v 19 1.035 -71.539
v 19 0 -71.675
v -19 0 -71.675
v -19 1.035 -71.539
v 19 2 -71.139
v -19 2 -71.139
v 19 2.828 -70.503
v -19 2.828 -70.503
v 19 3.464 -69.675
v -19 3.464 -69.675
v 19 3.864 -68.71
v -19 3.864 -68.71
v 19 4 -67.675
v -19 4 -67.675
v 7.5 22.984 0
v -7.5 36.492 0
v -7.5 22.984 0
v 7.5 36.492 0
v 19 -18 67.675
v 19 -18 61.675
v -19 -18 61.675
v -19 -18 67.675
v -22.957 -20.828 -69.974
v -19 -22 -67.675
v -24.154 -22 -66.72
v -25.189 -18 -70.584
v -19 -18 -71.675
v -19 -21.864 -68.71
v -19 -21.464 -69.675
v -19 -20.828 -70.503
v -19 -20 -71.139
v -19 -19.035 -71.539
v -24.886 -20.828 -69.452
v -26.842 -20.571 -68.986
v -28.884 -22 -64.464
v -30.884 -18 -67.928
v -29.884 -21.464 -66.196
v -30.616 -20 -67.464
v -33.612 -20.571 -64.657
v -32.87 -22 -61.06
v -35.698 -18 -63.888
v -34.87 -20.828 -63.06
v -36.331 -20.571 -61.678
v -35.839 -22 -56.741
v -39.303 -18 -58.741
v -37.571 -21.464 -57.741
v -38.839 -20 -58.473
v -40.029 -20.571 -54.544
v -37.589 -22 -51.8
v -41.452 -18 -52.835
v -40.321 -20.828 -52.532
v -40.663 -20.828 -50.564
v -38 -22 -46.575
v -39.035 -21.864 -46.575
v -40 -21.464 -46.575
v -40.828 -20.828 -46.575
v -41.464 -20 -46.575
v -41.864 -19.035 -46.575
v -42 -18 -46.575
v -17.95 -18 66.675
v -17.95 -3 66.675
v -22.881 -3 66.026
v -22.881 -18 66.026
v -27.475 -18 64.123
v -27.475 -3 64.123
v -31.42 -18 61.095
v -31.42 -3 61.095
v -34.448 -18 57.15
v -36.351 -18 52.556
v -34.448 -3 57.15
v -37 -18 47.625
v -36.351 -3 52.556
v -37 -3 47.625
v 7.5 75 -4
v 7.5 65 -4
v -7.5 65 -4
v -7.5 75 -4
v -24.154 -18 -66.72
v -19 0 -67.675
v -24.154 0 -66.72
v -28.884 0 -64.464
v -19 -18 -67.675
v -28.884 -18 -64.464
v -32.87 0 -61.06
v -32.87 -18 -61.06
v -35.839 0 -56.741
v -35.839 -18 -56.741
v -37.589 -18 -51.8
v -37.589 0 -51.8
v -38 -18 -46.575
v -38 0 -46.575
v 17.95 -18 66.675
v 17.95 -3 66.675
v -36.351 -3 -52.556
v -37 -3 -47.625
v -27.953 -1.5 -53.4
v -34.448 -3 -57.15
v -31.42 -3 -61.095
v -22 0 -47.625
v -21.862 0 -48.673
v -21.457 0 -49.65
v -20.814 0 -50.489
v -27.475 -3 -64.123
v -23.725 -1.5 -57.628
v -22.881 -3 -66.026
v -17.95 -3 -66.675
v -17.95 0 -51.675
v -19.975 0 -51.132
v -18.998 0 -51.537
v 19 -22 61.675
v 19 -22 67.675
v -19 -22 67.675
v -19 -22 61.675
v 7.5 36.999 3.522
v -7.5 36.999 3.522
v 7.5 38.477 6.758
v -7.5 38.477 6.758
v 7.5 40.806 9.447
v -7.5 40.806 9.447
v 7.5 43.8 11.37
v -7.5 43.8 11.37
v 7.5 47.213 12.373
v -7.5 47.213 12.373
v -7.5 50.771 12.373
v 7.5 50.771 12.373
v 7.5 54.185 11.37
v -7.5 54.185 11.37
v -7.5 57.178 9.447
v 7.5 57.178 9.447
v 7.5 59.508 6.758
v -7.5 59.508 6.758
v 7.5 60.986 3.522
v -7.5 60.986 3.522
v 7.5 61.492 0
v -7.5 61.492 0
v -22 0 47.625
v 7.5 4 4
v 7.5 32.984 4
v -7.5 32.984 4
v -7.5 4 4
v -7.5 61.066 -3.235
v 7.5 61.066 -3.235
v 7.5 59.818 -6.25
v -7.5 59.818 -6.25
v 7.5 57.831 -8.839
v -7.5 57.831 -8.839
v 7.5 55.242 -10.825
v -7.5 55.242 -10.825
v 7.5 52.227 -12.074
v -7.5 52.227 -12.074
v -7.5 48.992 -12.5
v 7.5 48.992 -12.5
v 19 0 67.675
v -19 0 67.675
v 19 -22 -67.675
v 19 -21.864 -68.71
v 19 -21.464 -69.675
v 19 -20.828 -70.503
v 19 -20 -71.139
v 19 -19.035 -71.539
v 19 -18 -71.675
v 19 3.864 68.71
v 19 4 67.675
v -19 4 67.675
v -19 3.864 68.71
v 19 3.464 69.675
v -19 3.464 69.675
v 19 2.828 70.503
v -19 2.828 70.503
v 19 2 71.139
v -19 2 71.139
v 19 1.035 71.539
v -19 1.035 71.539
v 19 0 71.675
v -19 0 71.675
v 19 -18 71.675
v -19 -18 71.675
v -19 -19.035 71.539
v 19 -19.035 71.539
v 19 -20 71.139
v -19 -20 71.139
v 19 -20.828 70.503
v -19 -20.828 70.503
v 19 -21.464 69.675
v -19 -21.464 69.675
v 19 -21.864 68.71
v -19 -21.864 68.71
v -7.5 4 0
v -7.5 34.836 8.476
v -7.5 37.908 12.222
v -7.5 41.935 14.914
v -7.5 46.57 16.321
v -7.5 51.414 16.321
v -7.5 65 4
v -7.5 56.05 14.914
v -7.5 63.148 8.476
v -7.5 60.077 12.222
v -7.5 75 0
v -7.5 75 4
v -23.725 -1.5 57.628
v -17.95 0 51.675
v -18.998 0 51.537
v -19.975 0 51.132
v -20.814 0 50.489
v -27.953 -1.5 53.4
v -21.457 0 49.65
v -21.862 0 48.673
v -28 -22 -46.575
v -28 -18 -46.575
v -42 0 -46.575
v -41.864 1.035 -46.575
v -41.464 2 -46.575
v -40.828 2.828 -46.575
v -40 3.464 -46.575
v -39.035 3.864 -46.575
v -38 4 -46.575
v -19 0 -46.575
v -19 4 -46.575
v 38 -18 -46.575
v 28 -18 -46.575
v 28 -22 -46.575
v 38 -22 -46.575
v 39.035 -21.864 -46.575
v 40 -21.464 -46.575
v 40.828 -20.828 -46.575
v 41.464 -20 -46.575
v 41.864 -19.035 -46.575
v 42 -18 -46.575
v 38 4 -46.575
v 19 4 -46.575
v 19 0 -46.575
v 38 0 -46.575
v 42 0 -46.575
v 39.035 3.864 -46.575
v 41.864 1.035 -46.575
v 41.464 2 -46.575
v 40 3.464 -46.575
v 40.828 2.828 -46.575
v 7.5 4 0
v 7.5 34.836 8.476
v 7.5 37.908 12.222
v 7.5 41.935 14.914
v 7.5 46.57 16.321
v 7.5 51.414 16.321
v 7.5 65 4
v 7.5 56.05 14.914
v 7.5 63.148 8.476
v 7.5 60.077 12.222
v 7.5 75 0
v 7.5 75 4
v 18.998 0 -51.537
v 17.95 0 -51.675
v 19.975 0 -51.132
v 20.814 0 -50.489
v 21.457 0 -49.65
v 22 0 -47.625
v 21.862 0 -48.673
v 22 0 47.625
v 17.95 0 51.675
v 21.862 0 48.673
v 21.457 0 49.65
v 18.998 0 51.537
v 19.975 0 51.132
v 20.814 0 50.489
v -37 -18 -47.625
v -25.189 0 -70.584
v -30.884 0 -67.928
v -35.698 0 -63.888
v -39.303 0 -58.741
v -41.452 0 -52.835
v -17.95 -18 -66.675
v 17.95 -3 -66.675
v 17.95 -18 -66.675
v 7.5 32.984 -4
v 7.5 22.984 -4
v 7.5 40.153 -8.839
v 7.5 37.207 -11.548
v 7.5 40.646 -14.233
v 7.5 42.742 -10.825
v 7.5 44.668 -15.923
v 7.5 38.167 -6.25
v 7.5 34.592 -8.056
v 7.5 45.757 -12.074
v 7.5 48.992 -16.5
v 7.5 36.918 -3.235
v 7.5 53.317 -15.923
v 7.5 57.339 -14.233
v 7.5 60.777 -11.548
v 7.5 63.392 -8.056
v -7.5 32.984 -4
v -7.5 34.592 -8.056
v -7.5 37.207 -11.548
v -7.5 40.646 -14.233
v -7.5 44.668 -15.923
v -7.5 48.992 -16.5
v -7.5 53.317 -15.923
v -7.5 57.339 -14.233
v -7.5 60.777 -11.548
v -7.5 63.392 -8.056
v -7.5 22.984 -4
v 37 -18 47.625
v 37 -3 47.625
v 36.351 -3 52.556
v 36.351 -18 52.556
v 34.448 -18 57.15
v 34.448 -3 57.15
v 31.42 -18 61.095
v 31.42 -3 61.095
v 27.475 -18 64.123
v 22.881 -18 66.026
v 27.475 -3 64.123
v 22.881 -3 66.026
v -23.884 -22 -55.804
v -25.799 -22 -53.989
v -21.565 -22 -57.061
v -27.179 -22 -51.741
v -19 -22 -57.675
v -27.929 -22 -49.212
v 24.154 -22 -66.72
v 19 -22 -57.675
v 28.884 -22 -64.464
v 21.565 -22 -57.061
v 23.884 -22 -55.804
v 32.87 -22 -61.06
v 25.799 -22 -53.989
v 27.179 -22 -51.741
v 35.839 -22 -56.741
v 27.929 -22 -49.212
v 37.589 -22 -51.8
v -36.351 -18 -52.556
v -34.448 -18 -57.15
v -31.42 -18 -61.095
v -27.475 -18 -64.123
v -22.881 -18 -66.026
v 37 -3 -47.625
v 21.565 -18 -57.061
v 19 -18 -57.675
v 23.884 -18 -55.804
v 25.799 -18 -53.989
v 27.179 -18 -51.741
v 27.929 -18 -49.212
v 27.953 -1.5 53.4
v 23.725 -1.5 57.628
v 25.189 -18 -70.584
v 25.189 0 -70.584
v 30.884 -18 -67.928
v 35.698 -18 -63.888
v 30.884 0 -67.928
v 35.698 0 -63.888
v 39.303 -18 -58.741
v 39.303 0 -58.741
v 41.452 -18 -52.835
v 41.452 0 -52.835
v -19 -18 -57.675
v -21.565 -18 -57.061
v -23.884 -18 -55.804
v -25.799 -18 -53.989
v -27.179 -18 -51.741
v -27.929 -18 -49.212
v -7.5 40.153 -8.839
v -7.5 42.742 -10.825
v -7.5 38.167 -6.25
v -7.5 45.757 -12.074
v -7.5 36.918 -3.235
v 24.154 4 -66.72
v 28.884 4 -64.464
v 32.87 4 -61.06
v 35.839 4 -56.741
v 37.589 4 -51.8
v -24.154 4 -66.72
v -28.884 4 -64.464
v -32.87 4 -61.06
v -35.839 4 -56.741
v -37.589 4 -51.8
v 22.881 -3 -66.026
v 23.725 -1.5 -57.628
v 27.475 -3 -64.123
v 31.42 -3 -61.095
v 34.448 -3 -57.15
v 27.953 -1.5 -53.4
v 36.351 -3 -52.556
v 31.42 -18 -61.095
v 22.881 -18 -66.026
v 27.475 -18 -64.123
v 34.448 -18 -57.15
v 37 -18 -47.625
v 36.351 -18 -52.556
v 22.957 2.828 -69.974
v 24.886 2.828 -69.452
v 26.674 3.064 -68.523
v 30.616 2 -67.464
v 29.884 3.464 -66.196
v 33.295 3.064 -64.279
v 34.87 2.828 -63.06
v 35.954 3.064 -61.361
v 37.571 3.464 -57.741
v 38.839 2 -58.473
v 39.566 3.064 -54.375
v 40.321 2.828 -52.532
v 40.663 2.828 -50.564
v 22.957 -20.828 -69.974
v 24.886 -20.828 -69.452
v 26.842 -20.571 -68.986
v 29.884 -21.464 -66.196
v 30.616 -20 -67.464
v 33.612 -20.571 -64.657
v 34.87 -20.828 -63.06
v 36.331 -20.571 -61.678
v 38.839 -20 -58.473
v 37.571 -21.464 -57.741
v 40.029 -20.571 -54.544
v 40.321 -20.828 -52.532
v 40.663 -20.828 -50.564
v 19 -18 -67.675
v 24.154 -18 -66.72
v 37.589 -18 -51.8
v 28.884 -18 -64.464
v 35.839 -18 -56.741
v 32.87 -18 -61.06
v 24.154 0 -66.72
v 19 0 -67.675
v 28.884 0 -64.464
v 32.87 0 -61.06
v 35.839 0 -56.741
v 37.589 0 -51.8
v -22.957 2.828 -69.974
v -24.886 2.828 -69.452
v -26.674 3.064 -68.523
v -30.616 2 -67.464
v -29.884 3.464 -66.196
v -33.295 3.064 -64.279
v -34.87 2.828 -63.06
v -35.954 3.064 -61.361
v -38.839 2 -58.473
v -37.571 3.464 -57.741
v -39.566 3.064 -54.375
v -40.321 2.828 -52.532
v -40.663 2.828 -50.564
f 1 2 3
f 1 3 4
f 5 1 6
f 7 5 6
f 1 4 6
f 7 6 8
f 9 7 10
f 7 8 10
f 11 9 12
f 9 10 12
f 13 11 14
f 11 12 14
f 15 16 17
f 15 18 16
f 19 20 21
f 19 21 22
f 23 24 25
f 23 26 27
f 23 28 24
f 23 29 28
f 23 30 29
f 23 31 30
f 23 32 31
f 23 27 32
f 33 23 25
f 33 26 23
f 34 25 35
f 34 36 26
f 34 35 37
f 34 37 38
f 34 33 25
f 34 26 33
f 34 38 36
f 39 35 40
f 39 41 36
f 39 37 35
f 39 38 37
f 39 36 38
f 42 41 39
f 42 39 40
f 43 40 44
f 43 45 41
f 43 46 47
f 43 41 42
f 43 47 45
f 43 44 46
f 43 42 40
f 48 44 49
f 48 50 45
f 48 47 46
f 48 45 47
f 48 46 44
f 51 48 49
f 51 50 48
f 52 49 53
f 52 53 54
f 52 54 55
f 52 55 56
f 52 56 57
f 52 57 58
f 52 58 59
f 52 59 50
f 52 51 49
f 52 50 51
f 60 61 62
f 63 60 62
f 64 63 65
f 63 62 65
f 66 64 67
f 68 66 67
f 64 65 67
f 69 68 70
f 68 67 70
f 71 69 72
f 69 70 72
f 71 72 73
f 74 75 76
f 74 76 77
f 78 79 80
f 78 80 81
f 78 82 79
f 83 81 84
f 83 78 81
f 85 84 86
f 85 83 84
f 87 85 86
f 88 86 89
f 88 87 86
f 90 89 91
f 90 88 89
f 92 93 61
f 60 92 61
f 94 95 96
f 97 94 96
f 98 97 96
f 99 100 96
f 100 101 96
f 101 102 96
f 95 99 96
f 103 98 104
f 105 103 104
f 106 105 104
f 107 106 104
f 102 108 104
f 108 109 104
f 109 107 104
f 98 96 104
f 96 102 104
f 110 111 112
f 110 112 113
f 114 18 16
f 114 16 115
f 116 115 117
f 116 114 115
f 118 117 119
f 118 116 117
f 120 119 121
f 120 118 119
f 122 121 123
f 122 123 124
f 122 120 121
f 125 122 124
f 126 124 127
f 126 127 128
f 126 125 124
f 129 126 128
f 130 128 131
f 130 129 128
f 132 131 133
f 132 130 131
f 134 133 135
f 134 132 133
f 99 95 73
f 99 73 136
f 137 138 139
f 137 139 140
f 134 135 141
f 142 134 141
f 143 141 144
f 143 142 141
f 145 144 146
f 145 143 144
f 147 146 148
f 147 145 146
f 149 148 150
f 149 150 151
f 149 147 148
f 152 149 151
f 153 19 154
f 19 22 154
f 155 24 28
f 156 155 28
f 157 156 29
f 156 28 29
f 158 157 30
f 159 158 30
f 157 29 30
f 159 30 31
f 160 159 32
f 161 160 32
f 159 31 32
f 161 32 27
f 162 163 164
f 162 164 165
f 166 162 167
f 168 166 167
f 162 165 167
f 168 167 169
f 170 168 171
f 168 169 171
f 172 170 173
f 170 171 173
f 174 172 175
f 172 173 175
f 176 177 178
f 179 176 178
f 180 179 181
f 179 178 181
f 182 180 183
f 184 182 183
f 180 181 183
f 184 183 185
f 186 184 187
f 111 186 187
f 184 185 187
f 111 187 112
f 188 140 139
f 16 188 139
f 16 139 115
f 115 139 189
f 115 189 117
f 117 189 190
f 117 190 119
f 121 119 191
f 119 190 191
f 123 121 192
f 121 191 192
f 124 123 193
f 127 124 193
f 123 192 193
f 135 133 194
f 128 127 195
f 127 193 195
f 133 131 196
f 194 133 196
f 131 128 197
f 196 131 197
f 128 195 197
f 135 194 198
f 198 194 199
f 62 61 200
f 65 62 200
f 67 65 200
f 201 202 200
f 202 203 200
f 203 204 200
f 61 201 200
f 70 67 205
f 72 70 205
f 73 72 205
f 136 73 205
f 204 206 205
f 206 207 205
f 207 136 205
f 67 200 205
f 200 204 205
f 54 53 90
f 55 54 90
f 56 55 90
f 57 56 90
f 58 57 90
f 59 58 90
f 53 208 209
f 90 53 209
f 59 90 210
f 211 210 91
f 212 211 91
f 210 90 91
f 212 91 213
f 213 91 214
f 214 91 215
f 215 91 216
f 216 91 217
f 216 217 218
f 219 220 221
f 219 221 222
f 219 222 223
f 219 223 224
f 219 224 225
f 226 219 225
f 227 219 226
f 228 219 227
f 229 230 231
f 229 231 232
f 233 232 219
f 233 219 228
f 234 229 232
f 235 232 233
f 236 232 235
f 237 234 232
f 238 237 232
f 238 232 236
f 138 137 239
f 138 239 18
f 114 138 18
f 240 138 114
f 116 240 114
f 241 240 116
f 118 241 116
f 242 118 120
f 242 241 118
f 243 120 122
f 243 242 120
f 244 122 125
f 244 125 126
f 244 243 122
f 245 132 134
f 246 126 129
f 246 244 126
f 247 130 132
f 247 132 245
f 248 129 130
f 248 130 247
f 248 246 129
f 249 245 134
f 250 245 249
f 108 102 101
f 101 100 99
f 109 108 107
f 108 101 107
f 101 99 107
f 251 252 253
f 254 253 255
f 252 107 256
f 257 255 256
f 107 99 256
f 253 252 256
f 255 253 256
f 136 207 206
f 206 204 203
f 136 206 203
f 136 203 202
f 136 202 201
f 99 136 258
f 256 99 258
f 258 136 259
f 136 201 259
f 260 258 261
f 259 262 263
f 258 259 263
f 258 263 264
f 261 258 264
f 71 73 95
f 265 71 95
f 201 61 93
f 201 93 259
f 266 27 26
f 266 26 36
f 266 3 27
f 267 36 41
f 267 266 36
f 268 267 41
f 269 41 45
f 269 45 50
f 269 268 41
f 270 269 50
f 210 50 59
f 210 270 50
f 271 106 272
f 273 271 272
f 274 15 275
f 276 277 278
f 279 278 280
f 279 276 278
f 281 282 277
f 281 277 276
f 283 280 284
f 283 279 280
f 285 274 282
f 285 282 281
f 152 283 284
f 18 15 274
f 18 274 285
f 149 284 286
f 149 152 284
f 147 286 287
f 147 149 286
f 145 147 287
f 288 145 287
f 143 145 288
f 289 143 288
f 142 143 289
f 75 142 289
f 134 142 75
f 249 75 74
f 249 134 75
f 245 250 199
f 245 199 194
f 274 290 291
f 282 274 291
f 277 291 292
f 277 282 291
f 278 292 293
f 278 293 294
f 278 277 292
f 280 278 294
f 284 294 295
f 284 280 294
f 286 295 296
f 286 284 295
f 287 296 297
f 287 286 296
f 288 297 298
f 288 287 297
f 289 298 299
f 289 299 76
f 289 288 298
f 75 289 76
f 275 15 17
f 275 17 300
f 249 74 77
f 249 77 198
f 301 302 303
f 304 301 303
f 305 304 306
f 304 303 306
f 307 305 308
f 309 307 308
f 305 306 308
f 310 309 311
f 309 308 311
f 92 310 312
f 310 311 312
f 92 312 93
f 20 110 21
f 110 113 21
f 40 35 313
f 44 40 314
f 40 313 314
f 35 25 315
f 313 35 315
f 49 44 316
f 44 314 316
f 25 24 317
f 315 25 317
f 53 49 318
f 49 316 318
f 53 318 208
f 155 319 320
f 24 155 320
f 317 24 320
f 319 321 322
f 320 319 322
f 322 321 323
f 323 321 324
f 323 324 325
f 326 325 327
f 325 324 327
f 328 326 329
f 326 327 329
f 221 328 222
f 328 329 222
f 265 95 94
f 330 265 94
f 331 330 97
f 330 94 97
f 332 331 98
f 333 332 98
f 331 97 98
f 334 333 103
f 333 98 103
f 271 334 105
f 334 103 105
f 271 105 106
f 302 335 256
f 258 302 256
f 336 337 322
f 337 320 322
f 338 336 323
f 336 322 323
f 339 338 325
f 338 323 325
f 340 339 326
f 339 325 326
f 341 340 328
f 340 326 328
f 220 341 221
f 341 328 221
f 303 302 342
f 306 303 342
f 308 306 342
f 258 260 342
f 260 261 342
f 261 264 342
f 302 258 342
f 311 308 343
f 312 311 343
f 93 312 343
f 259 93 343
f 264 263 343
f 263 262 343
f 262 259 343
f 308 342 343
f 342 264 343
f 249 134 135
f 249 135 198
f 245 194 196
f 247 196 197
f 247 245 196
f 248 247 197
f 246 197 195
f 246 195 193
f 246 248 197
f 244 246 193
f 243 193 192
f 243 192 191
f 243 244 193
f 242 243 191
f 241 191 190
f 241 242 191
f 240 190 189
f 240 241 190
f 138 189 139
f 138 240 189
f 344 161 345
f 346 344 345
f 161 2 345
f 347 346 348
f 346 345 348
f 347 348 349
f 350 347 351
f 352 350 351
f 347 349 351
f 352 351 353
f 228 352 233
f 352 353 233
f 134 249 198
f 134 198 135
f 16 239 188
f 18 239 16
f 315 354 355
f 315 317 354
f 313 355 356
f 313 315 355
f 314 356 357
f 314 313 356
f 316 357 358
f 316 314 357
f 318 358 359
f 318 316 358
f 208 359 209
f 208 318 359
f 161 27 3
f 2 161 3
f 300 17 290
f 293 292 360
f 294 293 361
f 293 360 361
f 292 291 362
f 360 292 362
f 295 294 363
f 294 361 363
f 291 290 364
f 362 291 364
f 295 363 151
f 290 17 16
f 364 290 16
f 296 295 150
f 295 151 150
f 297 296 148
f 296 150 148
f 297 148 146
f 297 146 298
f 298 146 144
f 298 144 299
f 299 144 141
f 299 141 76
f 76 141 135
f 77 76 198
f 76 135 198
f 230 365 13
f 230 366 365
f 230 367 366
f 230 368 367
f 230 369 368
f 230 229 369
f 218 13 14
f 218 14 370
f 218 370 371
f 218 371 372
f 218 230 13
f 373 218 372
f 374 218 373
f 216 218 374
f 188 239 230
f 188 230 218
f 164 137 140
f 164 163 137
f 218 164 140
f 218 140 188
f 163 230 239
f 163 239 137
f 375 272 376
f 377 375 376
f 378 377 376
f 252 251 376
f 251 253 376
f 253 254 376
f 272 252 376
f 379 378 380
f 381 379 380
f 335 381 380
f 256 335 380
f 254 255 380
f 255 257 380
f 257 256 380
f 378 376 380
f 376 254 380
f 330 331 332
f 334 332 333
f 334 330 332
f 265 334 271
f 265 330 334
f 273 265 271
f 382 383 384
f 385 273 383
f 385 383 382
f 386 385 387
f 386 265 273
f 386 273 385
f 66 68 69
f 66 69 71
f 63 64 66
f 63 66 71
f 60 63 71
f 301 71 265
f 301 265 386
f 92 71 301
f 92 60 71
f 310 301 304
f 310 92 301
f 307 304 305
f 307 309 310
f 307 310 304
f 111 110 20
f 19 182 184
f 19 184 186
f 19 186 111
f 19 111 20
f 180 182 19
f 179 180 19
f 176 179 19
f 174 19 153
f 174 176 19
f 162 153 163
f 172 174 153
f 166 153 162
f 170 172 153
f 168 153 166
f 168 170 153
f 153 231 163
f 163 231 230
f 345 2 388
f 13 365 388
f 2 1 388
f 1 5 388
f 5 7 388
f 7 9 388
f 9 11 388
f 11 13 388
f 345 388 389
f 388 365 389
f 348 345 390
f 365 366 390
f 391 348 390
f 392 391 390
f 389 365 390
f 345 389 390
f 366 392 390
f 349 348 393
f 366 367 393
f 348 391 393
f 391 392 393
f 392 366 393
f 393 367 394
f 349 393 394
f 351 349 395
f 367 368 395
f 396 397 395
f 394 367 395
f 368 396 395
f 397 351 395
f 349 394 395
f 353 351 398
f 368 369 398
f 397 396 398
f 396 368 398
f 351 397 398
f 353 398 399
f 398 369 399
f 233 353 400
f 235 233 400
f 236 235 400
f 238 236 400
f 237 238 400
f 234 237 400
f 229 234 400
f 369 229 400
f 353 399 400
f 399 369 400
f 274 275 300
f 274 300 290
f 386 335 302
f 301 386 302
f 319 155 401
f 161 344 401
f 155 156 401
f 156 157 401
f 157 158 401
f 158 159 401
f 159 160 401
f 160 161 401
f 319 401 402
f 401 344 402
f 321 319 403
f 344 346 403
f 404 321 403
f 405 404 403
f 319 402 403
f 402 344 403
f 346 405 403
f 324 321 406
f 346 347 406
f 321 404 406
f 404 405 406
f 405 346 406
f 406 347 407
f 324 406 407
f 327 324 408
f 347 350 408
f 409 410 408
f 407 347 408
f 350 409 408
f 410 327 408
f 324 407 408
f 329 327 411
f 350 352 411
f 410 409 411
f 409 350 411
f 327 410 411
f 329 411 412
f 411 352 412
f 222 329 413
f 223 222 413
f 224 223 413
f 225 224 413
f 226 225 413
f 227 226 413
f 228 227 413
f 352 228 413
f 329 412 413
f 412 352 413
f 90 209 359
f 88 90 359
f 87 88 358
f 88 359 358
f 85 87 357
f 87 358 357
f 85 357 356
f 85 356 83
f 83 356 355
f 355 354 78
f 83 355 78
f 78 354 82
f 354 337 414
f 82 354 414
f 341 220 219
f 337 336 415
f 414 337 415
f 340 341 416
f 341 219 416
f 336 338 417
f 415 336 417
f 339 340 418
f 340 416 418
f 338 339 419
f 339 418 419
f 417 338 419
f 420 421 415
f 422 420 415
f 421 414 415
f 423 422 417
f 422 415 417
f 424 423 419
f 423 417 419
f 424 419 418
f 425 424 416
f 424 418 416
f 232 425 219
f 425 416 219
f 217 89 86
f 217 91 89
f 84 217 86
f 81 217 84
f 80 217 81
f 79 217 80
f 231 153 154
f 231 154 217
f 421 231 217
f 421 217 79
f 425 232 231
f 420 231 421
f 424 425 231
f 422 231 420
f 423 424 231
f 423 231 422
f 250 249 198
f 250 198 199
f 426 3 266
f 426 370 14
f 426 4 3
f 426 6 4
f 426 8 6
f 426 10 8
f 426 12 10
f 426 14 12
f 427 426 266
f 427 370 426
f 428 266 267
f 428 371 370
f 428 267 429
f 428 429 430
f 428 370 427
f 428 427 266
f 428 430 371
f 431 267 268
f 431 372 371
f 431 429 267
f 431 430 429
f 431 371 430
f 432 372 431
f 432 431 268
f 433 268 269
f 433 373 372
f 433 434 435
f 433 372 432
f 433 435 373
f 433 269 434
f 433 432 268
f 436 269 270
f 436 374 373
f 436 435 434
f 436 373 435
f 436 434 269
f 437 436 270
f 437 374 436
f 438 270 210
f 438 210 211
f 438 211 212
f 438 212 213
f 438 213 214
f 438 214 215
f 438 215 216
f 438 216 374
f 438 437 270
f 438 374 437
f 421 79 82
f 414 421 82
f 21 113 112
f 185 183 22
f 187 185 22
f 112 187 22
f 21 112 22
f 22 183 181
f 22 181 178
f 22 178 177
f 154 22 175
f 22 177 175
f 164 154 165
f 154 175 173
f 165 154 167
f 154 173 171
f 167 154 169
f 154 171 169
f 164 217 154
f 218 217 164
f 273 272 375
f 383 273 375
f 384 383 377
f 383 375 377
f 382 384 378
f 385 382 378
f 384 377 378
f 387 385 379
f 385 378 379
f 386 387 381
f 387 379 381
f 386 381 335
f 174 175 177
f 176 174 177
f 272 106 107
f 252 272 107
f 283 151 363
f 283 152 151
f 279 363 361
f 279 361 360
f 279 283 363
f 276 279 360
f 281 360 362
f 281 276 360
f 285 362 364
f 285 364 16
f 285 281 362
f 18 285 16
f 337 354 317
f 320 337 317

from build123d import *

# Parameters (mm, degrees)
F1_DEPTH     = 18
F2_T1_DEPTH  = 35.9
F2_T3_DEPTH  = 95.25
F2_T6_ANGLE  = 90
F2_T8_ANGLE  = 90
F2_T10_ANGLE = 90
F2_T12_ANGLE = 90
F4_DEPTH     = 19
F8_ANGLE     = 90
F12_DEPTH    = 4
F14_DEPTH    = 7.5
F15_DEPTH    = 7.5


# Not quite as in the source:
# - a fillet or chamfer that OpenCascade refuses, or shapes differently, is made with other operations: its cross-section is extruded or revolved along the edge and cut away or added


with BuildPart() as f1:
    # F0 (on Front) → F1 (new body)
    with BuildSketch(Plane.XZ):
        with BuildLine():
            Line((-17.95, -66.675), (17.95, -66.675))
            ThreePointArc((17.95, -66.675), (31.4203841816, -61.0953841816), (37, -47.625))
            Line((37, -47.625), (37, 47.625))
            ThreePointArc((37, 47.625), (31.4203841816, 61.0953841816), (17.95, 66.675))
            Line((17.95, 66.675), (-17.95, 66.675))
            ThreePointArc((-17.95, 66.675), (-31.4203841816, 61.0953841816), (-37, 47.625))
            Line((-37, 47.625), (-37, -47.625))
            ThreePointArc((-37, -47.625), (-31.4203841816, -61.0953841816), (-17.95, -66.675))
        make_face()
    extrude(amount=F1_DEPTH)

    # F2: chamfer of 15 x 3 on 8 edges, made by hand

    # F2_s2 → F2_t1 (cut)
    with BuildSketch(Plane.YZ.offset(-17.95)):
        Polygon((-3, -66.675), (0, -51.675), (0, -66.675), align=None)
        Polygon((-3, 66.675), (0, 51.675), (0, 66.675), align=None)
    extrude(amount=F2_T1_DEPTH, mode=Mode.SUBTRACT)

    # F2_s4 → F2_t3 (cut)
    with BuildSketch(Plane.XY.offset(-47.625)):
        Polygon((37, -3), (22, 0), (37, 0), align=None)
        Polygon((-37, -3), (-22, 0), (-37, 0), align=None)
    extrude(amount=F2_T3_DEPTH, mode=Mode.SUBTRACT)

    # F2_s5 → F2_t6 (revolve, cut)
    with BuildSketch(Plane.YZ.offset(17.95)):
        Polygon((-3, -66.675), (0, -51.675), (0, -66.675), align=None)
    revolve(axis=Axis((17.95, 0, -47.625), (0, -1, 0)), revolution_arc=F2_T6_ANGLE, mode=Mode.SUBTRACT)

    # F2_s7 → F2_t8 (revolve, cut)
    with BuildSketch(Plane.XY.offset(47.625)):
        Polygon((37, -3), (22, 0), (37, 0), align=None)
    revolve(axis=Axis((17.95, 0, 47.625), (0, -1, 0)), revolution_arc=F2_T8_ANGLE, mode=Mode.SUBTRACT)

    # F2_s9 → F2_t10 (revolve, cut)
    with BuildSketch(Plane.YZ.offset(-17.95)):
        Polygon((-3, 66.675), (0, 51.675), (0, 66.675), align=None)
    revolve(axis=Axis((-17.95, 0, 47.625), (0, -1, 0)), revolution_arc=F2_T10_ANGLE, mode=Mode.SUBTRACT)

    # F2_s11 → F2_t12 (revolve, cut)
    with BuildSketch(Plane.XY.offset(-47.625)):
        Polygon((-37, -3), (-22, 0), (-37, 0), align=None)
    revolve(axis=Axis((-17.95, 0, -47.625), (0, -1, 0)), revolution_arc=F2_T12_ANGLE, mode=Mode.SUBTRACT)


with BuildPart() as f4:
    # F3 (on Right) → F4 (new body, symmetric)
    with BuildSketch(Plane.YZ):
        with BuildLine():
            Line((-18, 66.675), (-18, 67.675))
            Line((-18, 67.675), (-1.4493813505, 67.675))
            Line((-1.4493813505, 67.675), (0, 67.675))
            Line((0, 67.675), (0, -67.675))
            Line((0, -67.675), (-18, -67.675))
            Line((-18, -67.675), (-18, -57.675))
            Line((-18, -57.675), (-22, -57.675))
            Line((-22, -57.675), (-22, -67.675))
            ThreePointArc((-22, -67.675), (-20.8284271247, -70.5034271247), (-18, -71.675))
            Line((-18, -71.675), (0, -71.675))
            ThreePointArc((0, -71.675), (2.8284271247, -70.5034271247), (4, -67.675))
            Line((4, -67.675), (4, 67.675))
            ThreePointArc((4, 67.675), (2.8284271247, 70.5034271247), (0, 71.675))
            Line((0, 71.675), (-18, 71.675))
            ThreePointArc((-18, 71.675), (-20.8284271247, 70.5034271247), (-22, 67.675))
            Line((-22, 67.675), (-22, 61.675))
            Line((-22, 61.675), (-18, 61.675))
            Line((-18, 61.675), (-18, 66.675))
        make_face()
    extrude(amount=F4_DEPTH, both=True)

    # F5 (on face) → F8 (revolve)
    with BuildSketch(Plane.YZ.offset(19)):
        with BuildLine():
            Line((0, -67.675), (-18, -67.675))
            Line((-18, -67.675), (-18, -57.675))
            Line((-18, -57.675), (-22, -57.675))
            Line((-22, -57.675), (-22, -67.675))
            ThreePointArc((-22, -67.675), (-20.8284271247, -70.5034271247), (-18, -71.675))
            Line((-18, -71.675), (0, -71.675))
            ThreePointArc((0, -71.675), (2.8284271247, -70.5034271247), (4, -67.675))
            Line((4, -67.675), (4, -57.675))
            Line((4, -57.675), (0, -57.675))
            Line((0, -57.675), (0, -67.675))
        make_face()
    revolve(axis=Axis((17.95, -13.3947152644, -47.625), (0, -1, 0)), revolution_arc=F8_ANGLE)


with BuildPart() as f9_1:
    # F9: instance of F4
    add(f4.part.mirror(Plane.YZ))

    # F10: union F4
    add(f4.part)

    # F11 (on face) → F12 (join)
    with BuildSketch(Plane(origin=(0, 4, 0), x_dir=(-1, 0, 0), z_dir=(0, 1, 0))):
        with BuildLine():
            Line((-19, -46.575), (-28, -46.575))
            ThreePointArc((-28, -46.575), (-25.7988852712, -53.9889610307), (-19, -57.675))
            Line((-19, -57.675), (-19, -46.575))
        make_face()
        with BuildLine():
            Line((28, -46.575), (19, -46.575))
            Line((19, -46.575), (19, -57.675))
            ThreePointArc((19, -57.675), (25.7988852712, -53.9889610307), (28, -46.575))
        make_face()
    extrude(amount=-F12_DEPTH)

    # F13 (on Right) → F14 (join, symmetric)
    with BuildSketch(Plane.YZ):
        with BuildLine():
            Line((0, 4), (0, 0))
            Line((0, 0), (22.9843788128, 0))
            Line((22.9843788128, 0), (36.4921894064, 0))
            ThreePointArc((36.4921894064, 0), (48.9921894064, 12.5), (61.4921894064, 0))
            Line((61.4921894064, 0), (75, 0))
            Line((75, 0), (75, 4))
            Line((75, 4), (65, 4))
            ThreePointArc((65, 4), (48.9921894064, 16.5), (32.9843788128, 4))
            Line((32.9843788128, 4), (0, 4))
        make_face()
    extrude(amount=F14_DEPTH, both=True)


with BuildPart() as f15:
    # F13 (on Right) → F15 (new body, symmetric)
    with BuildSketch(Plane.YZ):
        with BuildLine():
            Line((36.4921894064, 0), (22.9843788128, 0))
            Line((22.9843788128, 0), (22.9843788128, -4))
            Line((22.9843788128, -4), (32.9843788128, -4))
            ThreePointArc((32.9843788128, -4), (38.8371414006, -13.0048068036), (48.9921894064, -16.5))
            Line((48.9921894064, -16.5), (48.9921894064, -12.5))
            ThreePointArc((48.9921894064, -12.5), (40.1533546416, -8.8388347648), (36.4921894064, 0))
        make_face()
        with BuildLine():
            Line((75, 0), (61.4921894064, 0))
            ThreePointArc((61.4921894064, 0), (57.8310241712, -8.8388347648), (48.9921894064, -12.5))
            Line((48.9921894064, -12.5), (48.9921894064, -16.5))
            ThreePointArc((48.9921894064, -16.5), (59.1472374122, -13.0048068036), (65, -4))
            Line((65, -4), (75, -4))
            Line((75, -4), (75, 0))
        make_face()
    extrude(amount=F15_DEPTH, both=True)


solid = Compound([f1.part, f9_1.part, f15.part])
